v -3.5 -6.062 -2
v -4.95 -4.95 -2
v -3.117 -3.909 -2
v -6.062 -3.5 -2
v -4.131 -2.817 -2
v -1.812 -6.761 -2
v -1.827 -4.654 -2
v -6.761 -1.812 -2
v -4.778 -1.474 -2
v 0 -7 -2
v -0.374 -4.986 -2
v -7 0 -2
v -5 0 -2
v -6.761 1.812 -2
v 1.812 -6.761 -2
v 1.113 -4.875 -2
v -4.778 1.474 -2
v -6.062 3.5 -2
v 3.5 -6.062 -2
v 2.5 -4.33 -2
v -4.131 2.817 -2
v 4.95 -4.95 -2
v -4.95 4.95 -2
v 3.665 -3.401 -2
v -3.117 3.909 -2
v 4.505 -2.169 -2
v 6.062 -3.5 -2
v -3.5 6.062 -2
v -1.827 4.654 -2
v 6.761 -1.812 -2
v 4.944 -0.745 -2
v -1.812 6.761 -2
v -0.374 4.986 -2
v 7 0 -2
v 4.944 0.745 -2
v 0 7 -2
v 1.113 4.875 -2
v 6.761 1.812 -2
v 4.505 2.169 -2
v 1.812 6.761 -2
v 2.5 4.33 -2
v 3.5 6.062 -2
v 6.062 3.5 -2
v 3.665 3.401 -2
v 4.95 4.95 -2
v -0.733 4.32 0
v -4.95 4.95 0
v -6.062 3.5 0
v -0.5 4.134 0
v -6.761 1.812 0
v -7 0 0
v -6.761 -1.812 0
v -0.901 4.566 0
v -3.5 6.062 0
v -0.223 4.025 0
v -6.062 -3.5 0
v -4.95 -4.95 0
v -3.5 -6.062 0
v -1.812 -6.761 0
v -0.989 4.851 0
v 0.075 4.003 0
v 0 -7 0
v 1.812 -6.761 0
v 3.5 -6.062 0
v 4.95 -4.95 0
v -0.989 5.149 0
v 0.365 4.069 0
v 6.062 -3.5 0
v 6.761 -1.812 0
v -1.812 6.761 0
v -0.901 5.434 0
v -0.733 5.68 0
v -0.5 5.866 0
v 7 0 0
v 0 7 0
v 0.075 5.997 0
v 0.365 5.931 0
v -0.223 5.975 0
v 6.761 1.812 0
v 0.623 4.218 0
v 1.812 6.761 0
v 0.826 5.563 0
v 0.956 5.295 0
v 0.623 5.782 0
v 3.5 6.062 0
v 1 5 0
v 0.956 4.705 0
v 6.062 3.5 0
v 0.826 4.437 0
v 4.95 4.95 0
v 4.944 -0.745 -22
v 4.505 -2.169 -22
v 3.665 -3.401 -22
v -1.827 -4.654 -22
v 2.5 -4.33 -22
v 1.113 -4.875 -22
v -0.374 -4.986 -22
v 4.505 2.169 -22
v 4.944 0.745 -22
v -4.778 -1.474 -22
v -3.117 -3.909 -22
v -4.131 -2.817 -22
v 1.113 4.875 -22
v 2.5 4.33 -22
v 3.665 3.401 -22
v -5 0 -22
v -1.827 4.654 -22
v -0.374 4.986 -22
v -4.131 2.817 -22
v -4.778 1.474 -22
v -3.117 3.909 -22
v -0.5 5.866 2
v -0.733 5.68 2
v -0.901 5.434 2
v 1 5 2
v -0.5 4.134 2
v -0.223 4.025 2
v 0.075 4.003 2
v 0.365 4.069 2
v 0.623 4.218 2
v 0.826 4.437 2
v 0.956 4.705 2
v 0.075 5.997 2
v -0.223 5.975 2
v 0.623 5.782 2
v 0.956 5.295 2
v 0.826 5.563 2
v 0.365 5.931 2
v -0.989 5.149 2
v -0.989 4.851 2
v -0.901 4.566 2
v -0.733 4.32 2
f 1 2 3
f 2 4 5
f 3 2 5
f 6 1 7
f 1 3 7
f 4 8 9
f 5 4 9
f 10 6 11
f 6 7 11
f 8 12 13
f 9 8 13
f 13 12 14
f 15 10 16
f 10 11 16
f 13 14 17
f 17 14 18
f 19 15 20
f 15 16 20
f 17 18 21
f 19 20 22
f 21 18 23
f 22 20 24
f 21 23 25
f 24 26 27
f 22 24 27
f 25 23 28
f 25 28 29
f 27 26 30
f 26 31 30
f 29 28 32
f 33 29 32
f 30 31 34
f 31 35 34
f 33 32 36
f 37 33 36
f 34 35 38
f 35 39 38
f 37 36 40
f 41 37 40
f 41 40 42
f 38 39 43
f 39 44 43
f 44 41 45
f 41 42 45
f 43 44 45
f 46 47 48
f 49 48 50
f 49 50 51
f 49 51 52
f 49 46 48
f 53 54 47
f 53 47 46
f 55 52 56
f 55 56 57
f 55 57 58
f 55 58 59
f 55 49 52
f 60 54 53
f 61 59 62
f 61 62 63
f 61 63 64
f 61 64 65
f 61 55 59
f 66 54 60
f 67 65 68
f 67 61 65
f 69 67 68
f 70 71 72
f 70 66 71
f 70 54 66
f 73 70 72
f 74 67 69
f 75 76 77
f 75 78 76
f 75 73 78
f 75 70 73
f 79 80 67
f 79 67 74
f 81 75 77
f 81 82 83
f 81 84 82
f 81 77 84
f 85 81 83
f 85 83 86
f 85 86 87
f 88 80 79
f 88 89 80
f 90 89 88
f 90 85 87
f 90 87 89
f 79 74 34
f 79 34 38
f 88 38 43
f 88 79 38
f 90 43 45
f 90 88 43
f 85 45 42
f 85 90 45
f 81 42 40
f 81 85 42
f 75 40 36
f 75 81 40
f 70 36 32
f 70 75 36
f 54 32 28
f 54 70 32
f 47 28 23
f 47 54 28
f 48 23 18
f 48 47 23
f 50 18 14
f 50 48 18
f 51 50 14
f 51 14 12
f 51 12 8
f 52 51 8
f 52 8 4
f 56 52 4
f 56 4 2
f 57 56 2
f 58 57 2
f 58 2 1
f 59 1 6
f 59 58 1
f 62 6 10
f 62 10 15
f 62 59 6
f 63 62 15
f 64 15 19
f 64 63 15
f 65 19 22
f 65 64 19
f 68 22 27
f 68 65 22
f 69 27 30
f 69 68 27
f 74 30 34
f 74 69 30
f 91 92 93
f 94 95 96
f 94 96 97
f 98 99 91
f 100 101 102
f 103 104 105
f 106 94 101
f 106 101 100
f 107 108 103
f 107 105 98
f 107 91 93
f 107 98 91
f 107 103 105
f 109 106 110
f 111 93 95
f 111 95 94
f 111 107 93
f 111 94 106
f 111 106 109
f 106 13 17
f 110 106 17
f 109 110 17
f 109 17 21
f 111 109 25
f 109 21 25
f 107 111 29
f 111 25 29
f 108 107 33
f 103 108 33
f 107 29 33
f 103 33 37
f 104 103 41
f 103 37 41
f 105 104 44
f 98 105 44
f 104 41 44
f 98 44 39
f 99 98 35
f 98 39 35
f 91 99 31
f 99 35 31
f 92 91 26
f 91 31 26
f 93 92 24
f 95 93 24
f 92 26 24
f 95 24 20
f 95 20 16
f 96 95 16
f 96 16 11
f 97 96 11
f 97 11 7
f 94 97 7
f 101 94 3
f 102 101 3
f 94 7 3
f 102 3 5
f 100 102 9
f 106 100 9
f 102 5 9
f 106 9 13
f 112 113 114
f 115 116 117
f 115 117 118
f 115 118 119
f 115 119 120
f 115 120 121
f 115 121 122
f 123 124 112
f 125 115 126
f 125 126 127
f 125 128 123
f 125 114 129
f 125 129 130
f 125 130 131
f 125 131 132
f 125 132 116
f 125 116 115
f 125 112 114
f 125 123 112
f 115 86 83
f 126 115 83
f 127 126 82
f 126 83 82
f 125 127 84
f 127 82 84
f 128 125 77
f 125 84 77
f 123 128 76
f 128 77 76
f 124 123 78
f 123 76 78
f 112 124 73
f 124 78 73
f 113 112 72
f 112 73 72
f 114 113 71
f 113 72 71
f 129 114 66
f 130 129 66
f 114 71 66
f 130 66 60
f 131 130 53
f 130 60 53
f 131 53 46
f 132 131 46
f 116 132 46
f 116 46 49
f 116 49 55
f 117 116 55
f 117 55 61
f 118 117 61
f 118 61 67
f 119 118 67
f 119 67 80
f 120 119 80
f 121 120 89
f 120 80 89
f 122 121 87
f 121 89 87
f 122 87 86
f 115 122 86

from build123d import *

# Parameters (mm, degrees)
SKETCH1_R           = 7
BOSS_EXTRUDE1_DEPTH = 2
SKETCH2_R           = 1
BOSS_EXTRUDE2_DEPTH = 2
SKETCH3_R           = 5
BOSS_EXTRUDE3_DEPTH = 20


with BuildPart() as part:
    # Sketch1 → Boss-Extrude1 (new body)
    with BuildSketch(Plane.XY):
        Circle(SKETCH1_R)
    extrude(amount=-BOSS_EXTRUDE1_DEPTH)

    # Sketch2 → Boss-Extrude2 (add)
    with BuildSketch(Plane.XY):
        with Locations((0, 5)):
            Circle(SKETCH2_R)
    extrude(amount=BOSS_EXTRUDE2_DEPTH)

    # Sketch3 → Boss-Extrude3 (add)
    with BuildSketch(Plane(origin=(0, 0, -2), x_dir=(-1, 0, 0), z_dir=(0, 0, -1))):
        Circle(SKETCH3_R)
    extrude(amount=BOSS_EXTRUDE3_DEPTH)


solid = part.part
